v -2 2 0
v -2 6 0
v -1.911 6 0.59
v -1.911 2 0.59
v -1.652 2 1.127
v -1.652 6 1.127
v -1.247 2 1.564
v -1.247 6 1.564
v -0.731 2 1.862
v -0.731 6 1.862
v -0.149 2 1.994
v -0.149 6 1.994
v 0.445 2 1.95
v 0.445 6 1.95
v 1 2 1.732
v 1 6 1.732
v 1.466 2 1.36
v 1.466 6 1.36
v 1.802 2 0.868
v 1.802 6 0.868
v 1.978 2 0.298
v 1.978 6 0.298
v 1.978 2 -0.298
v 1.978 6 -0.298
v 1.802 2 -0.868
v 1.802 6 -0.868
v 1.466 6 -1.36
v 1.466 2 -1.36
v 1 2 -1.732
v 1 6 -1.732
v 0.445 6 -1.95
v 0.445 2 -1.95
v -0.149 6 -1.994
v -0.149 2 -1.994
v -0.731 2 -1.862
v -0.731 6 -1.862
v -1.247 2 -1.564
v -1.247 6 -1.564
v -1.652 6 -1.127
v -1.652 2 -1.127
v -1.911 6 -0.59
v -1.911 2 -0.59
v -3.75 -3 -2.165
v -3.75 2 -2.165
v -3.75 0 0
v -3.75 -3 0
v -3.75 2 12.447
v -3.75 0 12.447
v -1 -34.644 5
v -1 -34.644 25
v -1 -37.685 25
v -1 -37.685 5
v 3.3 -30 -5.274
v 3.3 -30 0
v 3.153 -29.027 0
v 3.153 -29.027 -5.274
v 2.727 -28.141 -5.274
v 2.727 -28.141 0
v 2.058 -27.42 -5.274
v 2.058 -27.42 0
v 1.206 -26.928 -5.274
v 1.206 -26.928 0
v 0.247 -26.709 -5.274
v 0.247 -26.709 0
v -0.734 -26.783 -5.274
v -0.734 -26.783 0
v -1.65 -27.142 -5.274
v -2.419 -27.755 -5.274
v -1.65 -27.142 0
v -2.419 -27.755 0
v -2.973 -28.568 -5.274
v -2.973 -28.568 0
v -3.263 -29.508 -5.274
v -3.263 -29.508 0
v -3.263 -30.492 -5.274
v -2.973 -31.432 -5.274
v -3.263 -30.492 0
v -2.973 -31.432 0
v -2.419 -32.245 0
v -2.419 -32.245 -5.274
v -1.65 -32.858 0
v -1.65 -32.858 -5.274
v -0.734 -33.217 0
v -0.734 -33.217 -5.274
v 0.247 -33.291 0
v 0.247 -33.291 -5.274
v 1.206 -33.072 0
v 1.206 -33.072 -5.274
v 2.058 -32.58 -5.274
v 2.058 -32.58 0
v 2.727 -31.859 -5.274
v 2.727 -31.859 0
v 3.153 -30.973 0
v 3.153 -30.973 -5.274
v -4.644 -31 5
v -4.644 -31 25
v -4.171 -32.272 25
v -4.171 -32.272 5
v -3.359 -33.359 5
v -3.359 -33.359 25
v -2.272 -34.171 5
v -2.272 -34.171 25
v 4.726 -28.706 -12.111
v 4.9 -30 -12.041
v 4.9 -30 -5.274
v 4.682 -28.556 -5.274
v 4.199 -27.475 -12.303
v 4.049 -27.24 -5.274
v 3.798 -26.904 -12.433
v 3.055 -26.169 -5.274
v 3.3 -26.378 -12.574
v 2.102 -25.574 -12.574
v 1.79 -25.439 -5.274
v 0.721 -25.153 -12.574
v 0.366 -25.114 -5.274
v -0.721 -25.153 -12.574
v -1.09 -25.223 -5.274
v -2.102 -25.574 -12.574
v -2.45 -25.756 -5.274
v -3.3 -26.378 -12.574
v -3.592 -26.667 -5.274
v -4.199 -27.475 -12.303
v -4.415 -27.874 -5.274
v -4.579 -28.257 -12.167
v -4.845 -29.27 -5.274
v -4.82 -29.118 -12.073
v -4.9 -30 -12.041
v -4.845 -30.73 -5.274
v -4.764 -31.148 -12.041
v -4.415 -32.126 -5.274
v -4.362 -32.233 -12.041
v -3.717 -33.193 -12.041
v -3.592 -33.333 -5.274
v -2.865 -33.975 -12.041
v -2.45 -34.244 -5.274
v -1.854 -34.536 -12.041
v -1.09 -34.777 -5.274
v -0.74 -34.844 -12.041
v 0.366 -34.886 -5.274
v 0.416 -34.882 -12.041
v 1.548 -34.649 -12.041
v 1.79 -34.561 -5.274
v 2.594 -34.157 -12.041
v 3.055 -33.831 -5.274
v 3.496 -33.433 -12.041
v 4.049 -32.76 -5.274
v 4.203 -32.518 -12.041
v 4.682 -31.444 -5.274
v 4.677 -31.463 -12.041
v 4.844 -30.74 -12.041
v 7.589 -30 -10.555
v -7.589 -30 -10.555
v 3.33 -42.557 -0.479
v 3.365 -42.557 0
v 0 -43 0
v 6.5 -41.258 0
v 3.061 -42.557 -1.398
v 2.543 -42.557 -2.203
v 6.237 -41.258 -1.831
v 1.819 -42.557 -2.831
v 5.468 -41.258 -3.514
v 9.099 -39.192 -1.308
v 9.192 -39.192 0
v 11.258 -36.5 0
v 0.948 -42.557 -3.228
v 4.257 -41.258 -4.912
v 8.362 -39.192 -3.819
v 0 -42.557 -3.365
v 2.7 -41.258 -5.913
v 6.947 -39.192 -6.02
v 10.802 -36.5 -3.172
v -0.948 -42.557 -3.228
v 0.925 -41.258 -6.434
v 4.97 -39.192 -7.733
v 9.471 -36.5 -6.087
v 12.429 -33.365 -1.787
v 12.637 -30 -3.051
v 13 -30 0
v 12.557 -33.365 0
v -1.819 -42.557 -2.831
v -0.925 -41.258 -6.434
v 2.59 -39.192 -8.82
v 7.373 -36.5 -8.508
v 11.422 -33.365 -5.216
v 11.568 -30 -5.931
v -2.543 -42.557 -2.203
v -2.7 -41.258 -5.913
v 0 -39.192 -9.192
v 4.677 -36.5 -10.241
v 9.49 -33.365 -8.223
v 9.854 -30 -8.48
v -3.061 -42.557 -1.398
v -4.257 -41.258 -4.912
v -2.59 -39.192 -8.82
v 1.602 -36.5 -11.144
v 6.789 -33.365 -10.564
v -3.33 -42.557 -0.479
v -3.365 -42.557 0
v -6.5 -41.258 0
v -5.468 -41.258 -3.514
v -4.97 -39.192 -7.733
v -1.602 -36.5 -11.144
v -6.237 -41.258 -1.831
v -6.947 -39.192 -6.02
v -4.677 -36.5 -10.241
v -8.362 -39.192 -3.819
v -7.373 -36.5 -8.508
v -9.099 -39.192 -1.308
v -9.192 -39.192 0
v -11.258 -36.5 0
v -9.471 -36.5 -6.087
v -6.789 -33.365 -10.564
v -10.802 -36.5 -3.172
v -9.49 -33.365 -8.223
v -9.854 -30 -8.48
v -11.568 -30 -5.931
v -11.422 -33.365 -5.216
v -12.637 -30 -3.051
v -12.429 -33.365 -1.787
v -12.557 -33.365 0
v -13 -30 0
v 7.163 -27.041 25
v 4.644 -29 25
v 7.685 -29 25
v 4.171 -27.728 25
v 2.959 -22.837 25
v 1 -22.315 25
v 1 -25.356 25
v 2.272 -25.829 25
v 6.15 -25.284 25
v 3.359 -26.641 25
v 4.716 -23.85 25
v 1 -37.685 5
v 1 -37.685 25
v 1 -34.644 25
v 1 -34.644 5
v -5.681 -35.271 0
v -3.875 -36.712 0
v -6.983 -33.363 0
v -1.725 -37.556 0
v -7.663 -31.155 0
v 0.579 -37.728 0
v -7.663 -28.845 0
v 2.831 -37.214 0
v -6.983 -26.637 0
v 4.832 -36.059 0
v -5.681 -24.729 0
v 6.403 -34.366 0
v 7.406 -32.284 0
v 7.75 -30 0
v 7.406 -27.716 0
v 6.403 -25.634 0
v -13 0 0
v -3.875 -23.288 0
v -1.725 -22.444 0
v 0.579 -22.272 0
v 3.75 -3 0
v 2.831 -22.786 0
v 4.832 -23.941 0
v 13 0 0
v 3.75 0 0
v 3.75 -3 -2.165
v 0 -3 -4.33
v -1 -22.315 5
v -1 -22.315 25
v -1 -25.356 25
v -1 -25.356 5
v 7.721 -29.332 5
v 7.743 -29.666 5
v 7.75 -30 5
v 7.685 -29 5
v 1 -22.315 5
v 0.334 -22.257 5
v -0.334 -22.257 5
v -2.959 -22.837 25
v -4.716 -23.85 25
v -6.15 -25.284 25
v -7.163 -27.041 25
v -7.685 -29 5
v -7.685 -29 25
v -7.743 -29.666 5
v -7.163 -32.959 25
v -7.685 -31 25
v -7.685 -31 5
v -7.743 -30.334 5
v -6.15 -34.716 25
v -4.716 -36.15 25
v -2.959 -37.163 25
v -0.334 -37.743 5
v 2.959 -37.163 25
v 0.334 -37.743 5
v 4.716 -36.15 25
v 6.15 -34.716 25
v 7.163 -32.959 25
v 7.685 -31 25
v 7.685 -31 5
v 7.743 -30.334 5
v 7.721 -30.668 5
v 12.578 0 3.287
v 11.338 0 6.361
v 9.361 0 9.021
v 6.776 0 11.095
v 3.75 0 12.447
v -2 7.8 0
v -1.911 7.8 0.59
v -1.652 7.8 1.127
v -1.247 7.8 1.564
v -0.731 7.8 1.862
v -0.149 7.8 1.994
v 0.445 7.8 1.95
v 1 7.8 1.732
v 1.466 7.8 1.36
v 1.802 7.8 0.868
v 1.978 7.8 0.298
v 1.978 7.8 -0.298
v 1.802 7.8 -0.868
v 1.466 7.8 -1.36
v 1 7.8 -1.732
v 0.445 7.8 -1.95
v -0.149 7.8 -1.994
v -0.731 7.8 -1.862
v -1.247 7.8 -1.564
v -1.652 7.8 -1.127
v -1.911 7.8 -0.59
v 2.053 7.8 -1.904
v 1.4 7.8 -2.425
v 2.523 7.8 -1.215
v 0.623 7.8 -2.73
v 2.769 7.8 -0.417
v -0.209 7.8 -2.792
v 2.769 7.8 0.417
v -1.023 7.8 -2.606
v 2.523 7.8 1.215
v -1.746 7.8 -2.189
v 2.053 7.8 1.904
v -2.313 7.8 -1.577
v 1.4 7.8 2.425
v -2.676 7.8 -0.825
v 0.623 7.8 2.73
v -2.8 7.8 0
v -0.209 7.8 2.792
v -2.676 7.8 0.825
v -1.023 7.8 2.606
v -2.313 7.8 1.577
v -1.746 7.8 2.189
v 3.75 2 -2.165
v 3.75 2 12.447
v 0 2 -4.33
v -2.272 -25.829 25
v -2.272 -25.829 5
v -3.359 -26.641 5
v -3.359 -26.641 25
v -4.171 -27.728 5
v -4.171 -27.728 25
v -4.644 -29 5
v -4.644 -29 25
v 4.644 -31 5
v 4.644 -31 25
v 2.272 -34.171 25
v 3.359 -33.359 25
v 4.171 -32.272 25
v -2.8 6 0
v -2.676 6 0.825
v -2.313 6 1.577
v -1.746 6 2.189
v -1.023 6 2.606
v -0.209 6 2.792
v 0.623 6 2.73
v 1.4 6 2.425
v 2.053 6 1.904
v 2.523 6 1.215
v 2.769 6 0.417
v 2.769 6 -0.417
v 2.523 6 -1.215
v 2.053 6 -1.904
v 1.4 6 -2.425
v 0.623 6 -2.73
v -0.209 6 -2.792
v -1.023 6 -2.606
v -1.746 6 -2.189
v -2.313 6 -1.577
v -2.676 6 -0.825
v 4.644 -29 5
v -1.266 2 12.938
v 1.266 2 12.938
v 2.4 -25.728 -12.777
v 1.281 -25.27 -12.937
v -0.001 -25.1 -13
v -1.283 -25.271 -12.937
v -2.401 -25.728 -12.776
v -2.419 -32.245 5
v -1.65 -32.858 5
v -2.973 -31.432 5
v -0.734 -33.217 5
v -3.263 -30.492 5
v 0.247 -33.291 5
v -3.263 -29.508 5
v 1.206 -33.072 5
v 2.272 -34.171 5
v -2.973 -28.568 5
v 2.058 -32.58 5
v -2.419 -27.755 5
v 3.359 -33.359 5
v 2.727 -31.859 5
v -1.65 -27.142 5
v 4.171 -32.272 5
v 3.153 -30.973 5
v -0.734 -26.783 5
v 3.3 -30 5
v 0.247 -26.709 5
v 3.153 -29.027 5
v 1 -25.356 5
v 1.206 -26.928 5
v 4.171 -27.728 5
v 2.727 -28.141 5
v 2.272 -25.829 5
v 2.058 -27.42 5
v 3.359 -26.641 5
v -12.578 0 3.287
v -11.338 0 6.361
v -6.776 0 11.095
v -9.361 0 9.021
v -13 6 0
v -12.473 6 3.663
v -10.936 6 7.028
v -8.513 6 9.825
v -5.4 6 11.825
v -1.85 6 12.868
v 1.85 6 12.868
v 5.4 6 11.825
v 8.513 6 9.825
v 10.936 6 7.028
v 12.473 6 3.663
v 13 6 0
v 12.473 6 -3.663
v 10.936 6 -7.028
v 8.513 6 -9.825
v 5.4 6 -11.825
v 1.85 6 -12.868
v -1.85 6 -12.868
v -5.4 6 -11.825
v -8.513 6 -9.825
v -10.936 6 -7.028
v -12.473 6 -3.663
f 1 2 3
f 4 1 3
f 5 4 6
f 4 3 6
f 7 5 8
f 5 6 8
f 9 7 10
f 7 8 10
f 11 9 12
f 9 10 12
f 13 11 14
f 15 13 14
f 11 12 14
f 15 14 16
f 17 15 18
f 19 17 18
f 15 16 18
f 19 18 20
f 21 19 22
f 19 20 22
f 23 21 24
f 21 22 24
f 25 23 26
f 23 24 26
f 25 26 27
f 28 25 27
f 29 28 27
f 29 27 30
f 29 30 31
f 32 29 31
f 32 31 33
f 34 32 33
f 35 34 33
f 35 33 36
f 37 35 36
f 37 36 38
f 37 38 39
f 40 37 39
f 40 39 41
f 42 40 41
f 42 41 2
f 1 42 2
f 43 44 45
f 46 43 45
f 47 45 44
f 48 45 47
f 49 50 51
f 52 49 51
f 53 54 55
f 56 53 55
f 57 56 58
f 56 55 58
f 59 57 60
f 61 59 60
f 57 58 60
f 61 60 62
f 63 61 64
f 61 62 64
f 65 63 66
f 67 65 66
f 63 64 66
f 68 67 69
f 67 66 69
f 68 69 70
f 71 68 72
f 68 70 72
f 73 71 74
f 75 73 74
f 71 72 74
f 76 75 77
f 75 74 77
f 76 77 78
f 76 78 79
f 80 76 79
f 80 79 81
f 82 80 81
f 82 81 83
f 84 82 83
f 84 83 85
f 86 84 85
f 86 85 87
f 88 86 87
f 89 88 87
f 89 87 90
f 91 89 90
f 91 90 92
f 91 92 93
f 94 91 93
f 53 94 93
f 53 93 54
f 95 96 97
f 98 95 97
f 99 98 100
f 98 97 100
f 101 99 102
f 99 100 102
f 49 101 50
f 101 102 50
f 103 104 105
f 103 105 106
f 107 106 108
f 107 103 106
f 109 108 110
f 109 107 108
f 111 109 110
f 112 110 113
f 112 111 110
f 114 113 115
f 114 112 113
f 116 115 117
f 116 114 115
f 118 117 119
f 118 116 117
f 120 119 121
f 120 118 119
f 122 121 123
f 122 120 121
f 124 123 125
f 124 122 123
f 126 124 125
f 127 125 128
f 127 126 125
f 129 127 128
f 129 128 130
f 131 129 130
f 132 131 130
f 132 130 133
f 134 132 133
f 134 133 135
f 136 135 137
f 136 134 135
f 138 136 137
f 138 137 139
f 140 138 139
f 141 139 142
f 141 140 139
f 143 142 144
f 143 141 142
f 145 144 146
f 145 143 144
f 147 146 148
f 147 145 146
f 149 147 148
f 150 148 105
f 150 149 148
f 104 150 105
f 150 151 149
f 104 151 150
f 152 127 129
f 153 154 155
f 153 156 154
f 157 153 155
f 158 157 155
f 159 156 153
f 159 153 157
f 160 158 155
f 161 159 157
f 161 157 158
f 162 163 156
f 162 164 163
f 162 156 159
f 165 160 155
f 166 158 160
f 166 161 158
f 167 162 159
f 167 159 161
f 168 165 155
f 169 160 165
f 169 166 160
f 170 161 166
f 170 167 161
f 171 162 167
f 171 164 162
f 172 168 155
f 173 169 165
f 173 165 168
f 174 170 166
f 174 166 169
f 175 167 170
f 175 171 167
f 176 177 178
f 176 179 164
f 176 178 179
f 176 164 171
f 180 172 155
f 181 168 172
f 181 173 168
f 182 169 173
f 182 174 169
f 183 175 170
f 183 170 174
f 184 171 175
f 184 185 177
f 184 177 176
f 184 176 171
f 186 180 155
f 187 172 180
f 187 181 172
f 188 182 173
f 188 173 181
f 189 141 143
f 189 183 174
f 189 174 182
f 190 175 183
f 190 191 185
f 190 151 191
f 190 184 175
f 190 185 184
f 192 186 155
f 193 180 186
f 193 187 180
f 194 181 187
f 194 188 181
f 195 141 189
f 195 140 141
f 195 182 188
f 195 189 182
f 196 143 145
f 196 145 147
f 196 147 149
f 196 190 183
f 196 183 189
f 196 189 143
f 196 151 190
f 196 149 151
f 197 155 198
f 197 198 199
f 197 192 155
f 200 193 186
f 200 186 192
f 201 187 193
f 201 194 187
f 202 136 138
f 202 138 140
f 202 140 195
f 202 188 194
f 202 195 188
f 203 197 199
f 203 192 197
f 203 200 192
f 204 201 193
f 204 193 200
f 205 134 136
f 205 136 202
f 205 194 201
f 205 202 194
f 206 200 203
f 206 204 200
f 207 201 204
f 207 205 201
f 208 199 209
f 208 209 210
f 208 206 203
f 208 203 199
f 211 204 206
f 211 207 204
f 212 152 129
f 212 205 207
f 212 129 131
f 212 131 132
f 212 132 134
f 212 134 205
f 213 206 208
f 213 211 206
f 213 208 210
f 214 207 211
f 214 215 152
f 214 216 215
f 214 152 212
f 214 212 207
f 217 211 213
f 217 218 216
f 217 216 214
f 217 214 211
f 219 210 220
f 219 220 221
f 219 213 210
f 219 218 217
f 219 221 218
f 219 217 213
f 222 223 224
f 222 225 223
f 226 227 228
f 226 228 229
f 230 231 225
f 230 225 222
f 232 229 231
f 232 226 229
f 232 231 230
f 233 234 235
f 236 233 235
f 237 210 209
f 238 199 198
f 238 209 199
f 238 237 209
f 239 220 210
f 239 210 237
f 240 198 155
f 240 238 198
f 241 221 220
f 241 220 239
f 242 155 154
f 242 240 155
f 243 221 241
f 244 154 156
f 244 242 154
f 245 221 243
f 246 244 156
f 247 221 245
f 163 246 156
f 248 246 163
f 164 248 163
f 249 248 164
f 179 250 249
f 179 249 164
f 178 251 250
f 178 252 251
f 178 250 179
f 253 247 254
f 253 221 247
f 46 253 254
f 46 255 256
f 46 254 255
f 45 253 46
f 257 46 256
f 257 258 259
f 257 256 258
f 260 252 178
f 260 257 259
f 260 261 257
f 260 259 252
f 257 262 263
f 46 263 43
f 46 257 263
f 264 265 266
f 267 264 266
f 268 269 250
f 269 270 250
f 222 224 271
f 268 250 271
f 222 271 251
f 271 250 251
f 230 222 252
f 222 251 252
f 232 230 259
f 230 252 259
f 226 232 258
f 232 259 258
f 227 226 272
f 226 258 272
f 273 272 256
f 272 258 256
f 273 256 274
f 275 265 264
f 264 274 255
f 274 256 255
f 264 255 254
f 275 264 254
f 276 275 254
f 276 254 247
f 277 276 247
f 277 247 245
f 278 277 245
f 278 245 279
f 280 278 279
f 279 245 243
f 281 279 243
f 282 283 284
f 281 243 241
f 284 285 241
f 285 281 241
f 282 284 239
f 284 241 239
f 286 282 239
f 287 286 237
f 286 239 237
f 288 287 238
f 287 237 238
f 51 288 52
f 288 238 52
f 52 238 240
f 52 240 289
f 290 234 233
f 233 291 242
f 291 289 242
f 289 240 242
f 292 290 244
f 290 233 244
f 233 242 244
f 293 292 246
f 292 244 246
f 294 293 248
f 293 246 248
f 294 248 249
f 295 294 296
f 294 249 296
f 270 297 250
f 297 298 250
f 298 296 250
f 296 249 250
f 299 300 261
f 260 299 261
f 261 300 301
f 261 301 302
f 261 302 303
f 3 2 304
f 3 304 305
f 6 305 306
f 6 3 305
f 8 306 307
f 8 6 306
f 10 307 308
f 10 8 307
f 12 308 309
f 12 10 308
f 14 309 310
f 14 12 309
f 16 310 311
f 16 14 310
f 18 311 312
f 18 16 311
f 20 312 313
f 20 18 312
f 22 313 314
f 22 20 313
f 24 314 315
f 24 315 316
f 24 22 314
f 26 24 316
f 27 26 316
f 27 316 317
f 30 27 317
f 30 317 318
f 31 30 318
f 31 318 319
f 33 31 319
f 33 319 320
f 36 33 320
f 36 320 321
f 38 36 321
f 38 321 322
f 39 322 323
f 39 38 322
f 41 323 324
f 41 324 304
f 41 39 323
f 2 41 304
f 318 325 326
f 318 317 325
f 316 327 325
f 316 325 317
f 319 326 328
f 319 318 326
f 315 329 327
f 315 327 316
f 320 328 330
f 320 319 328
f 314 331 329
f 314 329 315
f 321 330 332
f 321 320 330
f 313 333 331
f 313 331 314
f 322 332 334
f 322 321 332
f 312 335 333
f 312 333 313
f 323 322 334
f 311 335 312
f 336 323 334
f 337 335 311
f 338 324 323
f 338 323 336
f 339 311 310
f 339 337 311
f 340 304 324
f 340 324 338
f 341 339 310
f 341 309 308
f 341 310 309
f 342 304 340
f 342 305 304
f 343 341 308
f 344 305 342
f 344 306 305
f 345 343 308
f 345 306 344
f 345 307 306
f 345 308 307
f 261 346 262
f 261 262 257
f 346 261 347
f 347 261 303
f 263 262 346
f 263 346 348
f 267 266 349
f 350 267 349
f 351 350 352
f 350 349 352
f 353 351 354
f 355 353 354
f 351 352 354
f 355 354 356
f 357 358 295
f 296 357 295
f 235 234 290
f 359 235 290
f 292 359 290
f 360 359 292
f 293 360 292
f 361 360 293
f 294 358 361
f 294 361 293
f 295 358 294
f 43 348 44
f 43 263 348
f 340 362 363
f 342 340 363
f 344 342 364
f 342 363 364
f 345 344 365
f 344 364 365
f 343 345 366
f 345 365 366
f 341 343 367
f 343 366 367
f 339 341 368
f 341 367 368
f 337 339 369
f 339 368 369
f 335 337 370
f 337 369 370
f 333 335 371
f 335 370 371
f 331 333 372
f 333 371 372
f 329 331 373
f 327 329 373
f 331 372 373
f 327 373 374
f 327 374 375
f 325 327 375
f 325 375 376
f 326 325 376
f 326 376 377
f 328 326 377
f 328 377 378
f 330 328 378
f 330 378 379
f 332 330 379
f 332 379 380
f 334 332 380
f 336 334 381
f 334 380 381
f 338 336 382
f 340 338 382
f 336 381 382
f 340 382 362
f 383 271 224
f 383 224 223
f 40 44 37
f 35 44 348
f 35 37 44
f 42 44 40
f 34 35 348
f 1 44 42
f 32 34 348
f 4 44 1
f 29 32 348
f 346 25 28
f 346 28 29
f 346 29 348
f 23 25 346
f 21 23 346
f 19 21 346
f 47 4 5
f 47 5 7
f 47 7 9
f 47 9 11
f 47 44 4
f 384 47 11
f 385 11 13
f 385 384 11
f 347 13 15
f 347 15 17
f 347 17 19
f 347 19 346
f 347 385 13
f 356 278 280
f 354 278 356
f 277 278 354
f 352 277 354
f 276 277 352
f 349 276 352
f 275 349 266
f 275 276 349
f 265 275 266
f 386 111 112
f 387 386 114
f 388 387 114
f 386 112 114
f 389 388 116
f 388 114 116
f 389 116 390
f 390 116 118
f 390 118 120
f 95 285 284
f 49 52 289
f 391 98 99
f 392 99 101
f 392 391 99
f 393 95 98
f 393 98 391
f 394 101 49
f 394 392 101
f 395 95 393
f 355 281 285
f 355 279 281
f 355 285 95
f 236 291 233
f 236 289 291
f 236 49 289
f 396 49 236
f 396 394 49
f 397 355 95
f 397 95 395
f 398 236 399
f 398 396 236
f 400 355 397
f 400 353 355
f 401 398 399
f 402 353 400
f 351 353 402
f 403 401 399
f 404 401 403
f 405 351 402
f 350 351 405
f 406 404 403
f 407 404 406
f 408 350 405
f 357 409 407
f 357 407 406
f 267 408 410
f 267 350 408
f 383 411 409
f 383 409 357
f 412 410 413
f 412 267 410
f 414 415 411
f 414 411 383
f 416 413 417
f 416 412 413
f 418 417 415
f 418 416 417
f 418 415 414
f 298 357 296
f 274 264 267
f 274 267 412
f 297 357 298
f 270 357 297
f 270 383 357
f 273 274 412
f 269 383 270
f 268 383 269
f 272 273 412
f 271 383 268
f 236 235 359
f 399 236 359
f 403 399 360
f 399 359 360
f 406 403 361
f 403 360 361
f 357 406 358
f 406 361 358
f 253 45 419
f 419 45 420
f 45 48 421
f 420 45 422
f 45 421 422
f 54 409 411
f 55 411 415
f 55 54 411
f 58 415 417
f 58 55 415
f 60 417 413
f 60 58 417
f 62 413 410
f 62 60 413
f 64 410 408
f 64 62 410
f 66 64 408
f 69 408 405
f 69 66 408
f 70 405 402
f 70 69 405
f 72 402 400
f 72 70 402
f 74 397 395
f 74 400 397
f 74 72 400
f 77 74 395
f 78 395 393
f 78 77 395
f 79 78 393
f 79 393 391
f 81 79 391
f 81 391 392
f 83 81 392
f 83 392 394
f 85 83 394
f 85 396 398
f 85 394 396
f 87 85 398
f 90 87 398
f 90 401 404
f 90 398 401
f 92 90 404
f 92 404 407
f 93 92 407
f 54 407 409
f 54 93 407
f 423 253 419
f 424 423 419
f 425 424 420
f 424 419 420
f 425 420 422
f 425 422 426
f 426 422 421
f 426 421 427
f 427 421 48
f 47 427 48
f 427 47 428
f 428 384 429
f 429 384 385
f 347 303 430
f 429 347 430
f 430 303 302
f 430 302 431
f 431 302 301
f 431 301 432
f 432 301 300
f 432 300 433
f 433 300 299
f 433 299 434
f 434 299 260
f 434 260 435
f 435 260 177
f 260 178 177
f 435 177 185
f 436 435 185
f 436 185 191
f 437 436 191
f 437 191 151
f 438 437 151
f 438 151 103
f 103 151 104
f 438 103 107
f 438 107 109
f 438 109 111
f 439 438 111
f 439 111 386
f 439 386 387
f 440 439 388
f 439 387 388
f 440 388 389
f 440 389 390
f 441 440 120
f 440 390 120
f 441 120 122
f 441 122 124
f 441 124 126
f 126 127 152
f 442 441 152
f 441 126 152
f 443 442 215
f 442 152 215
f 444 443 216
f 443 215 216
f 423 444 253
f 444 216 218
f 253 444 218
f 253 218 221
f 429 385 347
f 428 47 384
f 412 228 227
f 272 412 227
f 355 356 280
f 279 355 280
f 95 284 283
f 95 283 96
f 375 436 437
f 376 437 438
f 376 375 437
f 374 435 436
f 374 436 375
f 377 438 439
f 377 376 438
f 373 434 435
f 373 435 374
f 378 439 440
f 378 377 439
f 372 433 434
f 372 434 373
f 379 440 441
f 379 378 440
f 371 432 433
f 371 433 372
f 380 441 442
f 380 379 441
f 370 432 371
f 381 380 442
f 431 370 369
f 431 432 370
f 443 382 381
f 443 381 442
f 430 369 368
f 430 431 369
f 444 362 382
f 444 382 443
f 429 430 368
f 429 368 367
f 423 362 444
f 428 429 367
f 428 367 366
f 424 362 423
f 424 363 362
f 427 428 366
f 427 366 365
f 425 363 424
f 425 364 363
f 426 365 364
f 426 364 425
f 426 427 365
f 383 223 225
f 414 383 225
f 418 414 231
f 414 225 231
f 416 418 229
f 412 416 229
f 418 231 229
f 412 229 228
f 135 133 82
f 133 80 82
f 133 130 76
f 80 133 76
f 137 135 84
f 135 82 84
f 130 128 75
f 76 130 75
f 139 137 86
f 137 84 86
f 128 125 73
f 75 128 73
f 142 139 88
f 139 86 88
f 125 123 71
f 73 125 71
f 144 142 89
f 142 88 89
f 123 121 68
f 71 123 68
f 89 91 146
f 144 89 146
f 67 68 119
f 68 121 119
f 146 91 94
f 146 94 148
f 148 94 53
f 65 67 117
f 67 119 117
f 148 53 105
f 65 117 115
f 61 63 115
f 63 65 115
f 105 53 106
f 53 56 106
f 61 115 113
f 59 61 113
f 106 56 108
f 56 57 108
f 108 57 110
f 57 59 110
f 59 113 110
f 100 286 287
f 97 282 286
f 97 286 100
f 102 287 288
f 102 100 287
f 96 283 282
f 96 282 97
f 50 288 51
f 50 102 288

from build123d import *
from build123d import SkipClean  # not in build123d's __all__

# Parameters (mm, degrees)
F1_ANGLE  = 180
F2_R      = 13
F3_DEPTH  = 6
F4_R      = 2
F5_DEPTH  = 6
F7_DEPTH  = 2
F8_DEPTH  = 5
F9_DEPTH  = 3
F10_W     = 7.5
F10_H     = 12.1405349095
F11_DEPTH = 2
F12_R     = 2.8
F12_R_2   = 2
F13_DEPTH = 1.8
F14_R     = 3.3
F15_DEPTH = 25
F17_R     = 4.9
F18_DEPTH = 7.3
F19_DEPTH = 25
F20_R     = 7.75
F20_R_2   = 3.3
F21_DEPTH = 25
F23_DEPTH = 20


# Not quite as in the source:
# - after a boolean that leaves OpenCascade's solid faulty, fix() repairs it


with BuildPart() as f1:
    # F0 (on Top) → F1 (revolve)
    with BuildSketch(Plane.XY):
        with BuildLine():
            Line((13, 0), (0, 0))
            Line((0, 0), (0, -43))
            ThreePointArc((0, -43), (9.1923881554, -39.1923881554), (13, -30))
            Line((13, -30), (13, 0))
        make_face()
    revolve(axis=Axis((0, -21.5, 0), (0, 1, 0)), revolution_arc=F1_ANGLE)

    # F2 (on face) → F3 (join)
    with BuildSketch(Plane(origin=(0, 0, 0), x_dir=(-1, 0, 0), z_dir=(0, 1, 0))):
        Circle(F2_R)
    with SkipClean():  # cleaning this boolean's faces spoils the solid; the shape is the same uncleaned
        extrude(amount=F3_DEPTH)

    # F4 (on face) → F5 (cut)
    with BuildSketch(Plane(origin=(0, 6, 0), x_dir=(-1, 0, 0), z_dir=(0, 1, 0))):
        Circle(F4_R)
    extrude(amount=-F5_DEPTH, mode=Mode.SUBTRACT)

    add(f1.part.fix(), mode=Mode.REPLACE)

    # F6 (on face) → F7 (cut)
    with BuildSketch(Plane(origin=(0, 0, 0), x_dir=(-1, 0, 0), z_dir=(0, 1, 0))):
        Polygon((3.75, 2.1650635095), (0, 4.3301270189), (-3.75, 2.1650635095), (-3.75, -2.1650635095), (0, -4.3301270189), (3.75, -2.1650635095), align=None)
    extrude(amount=F7_DEPTH, mode=Mode.SUBTRACT)

    # F8 (cut): a face of the model
    f8_faces = [f1.faces().sort_by_distance(p)[0] for p in [
        (-3.6354356076, 2, 0),
    ]]
    extrude(f8_faces, amount=F8_DEPTH, mode=Mode.SUBTRACT)

    # F9 (cut): a face of the model
    f9_faces = [f1.faces().sort_by_distance(p)[0] for p in [
        (0, 0, -0.8488263632),
    ]]
    extrude(f9_faces, amount=-F9_DEPTH, mode=Mode.SUBTRACT)

    # F10 (on face) → F11 (cut)
    with BuildSketch(Plane.XZ):
        with Locations((0, 8.2353309642)):
            Rectangle(F10_W, F10_H)
    extrude(amount=-F11_DEPTH, mode=Mode.SUBTRACT)

    # F12 (on face) → F13 (join)
    with BuildSketch(Plane(origin=(0, 6, 0), x_dir=(-1, 0, 0), z_dir=(0, 1, 0))):
        Circle(F12_R)
        Circle(F12_R_2, mode=Mode.SUBTRACT)
    extrude(amount=F13_DEPTH)

    # F14 (on face) → F15 (cut)
    with BuildSketch(Plane.XY):
        with Locations((0, -30)):
            Circle(F14_R)
    extrude(amount=-F15_DEPTH, mode=Mode.SUBTRACT)

    # F17 (on face) → F18 (cut)
    with BuildSketch(Plane.XY.offset(-12.5741798937)):
        with Locations((0, -30)):
            Circle(F17_R)
    extrude(amount=F18_DEPTH, mode=Mode.SUBTRACT)

    # F19 (cut): a face of the model
    f19_faces = [f1.faces().sort_by_distance(p)[0] for p in [
        (-4.7614070709, -30, -5.2741798937),
    ]]
    extrude(f19_faces, amount=F19_DEPTH, mode=Mode.SUBTRACT)

    # F20 (on face) → F21 (join)
    with BuildSketch(Plane.XY):
        with Locations((0, -30)):
            Circle(F20_R)
        with Locations((0, -30)):
            Circle(F20_R_2, mode=Mode.SUBTRACT)
    extrude(amount=F21_DEPTH)

    # F22 (on face) → F23 (cut)
    with BuildSketch(Plane.XY.offset(25)):
        with BuildLine():
            ThreePointArc((4.6435439053, -31), (4.7233109971, -30.502825243), (4.75, -30))
            ThreePointArc((4.75, -30), (4.7233109971, -29.497174757), (4.6435439053, -29))
            Line((4.6435439053, -29), (1, -29))
            Line((1, -29), (1, -31))
            Line((1, -31), (4.6435439053, -31))
        make_face()
        with BuildLine():
            ThreePointArc((4.6435439053, -29), (4.7233109971, -29.497174757), (4.75, -30))
            ThreePointArc((4.75, -30), (4.7233109971, -30.502825243), (4.6435439053, -31))
            Line((4.6435439053, -31), (10.7483885819, -31))
            Line((10.7483885819, -31), (10.7483885819, -29))
            Line((10.7483885819, -29), (4.6435439053, -29))
        make_face()
        with BuildLine():
            Line((1, -29), (4.6435439053, -29))
            ThreePointArc((4.6435439053, -29), (3.3587572106, -26.6412427894), (1, -25.3564560947))
            Line((1, -25.3564560947), (1, -29))
        make_face()
        with BuildLine():
            ThreePointArc((1, -34.6435439053), (3.3587572106, -33.3587572106), (4.6435439053, -31))
            Line((4.6435439053, -31), (1, -31))
            Line((1, -31), (1, -34.6435439053))
        make_face()
        with BuildLine():
            Line((1, -29), (1, -25.3564560947))
            ThreePointArc((1, -25.3564560947), (0, -25.25), (-1, -25.3564560947))
            Line((-1, -25.3564560947), (-1, -29))
            Line((-1, -29), (1, -29))
        make_face()
        with BuildLine():
            ThreePointArc((-1, -25.3564560947), (0, -25.25), (1, -25.3564560947))
            Line((1, -25.3564560947), (1, -19.8912940045))
            Line((1, -19.8912940045), (-1, -19.8912940045))
            Line((-1, -19.8912940045), (-1, -25.3564560947))
        make_face()
        with BuildLine():
            Line((1, -40.1087059955), (1, -34.6435439053))
            ThreePointArc((1, -34.6435439053), (0, -34.75), (-1, -34.6435439053))
            Line((-1, -34.6435439053), (-1, -40.1087059955))
            Line((-1, -40.1087059955), (1, -40.1087059955))
        make_face()
        with BuildLine():
            ThreePointArc((-1, -34.6435439053), (0, -34.75), (1, -34.6435439053))
            Line((1, -34.6435439053), (1, -31))
            Line((1, -31), (-1, -31))
            Line((-1, -31), (-1, -34.6435439053))
        make_face()
        with BuildLine():
            Line((-1, -29), (-1, -25.3564560947))
            ThreePointArc((-1, -25.3564560947), (-3.3587572106, -26.6412427894), (-4.6435439053, -29))
            Line((-4.6435439053, -29), (-1, -29))
        make_face()
        with BuildLine():
            Line((-1, -31), (-1, -29))
            Line((-1, -29), (-4.6435439053, -29))
            ThreePointArc((-4.6435439053, -29), (-4.75, -30), (-4.6435439053, -31))
            Line((-4.6435439053, -31), (-1, -31))
        make_face()
        with BuildLine():
            ThreePointArc((-4.6435439053, -31), (-3.3587572106, -33.3587572106), (-1, -34.6435439053))
            Line((-1, -34.6435439053), (-1, -31))
            Line((-1, -31), (-4.6435439053, -31))
        make_face()
        with BuildLine():
            ThreePointArc((-4.6435439053, -31), (-4.75, -30), (-4.6435439053, -29))
            Line((-4.6435439053, -29), (-10.7483885819, -29))
            Line((-10.7483885819, -29), (-10.7483885819, -31))
            Line((-10.7483885819, -31), (-4.6435439053, -31))
        make_face()
    extrude(amount=-F23_DEPTH, mode=Mode.SUBTRACT)


solid = f1.part
